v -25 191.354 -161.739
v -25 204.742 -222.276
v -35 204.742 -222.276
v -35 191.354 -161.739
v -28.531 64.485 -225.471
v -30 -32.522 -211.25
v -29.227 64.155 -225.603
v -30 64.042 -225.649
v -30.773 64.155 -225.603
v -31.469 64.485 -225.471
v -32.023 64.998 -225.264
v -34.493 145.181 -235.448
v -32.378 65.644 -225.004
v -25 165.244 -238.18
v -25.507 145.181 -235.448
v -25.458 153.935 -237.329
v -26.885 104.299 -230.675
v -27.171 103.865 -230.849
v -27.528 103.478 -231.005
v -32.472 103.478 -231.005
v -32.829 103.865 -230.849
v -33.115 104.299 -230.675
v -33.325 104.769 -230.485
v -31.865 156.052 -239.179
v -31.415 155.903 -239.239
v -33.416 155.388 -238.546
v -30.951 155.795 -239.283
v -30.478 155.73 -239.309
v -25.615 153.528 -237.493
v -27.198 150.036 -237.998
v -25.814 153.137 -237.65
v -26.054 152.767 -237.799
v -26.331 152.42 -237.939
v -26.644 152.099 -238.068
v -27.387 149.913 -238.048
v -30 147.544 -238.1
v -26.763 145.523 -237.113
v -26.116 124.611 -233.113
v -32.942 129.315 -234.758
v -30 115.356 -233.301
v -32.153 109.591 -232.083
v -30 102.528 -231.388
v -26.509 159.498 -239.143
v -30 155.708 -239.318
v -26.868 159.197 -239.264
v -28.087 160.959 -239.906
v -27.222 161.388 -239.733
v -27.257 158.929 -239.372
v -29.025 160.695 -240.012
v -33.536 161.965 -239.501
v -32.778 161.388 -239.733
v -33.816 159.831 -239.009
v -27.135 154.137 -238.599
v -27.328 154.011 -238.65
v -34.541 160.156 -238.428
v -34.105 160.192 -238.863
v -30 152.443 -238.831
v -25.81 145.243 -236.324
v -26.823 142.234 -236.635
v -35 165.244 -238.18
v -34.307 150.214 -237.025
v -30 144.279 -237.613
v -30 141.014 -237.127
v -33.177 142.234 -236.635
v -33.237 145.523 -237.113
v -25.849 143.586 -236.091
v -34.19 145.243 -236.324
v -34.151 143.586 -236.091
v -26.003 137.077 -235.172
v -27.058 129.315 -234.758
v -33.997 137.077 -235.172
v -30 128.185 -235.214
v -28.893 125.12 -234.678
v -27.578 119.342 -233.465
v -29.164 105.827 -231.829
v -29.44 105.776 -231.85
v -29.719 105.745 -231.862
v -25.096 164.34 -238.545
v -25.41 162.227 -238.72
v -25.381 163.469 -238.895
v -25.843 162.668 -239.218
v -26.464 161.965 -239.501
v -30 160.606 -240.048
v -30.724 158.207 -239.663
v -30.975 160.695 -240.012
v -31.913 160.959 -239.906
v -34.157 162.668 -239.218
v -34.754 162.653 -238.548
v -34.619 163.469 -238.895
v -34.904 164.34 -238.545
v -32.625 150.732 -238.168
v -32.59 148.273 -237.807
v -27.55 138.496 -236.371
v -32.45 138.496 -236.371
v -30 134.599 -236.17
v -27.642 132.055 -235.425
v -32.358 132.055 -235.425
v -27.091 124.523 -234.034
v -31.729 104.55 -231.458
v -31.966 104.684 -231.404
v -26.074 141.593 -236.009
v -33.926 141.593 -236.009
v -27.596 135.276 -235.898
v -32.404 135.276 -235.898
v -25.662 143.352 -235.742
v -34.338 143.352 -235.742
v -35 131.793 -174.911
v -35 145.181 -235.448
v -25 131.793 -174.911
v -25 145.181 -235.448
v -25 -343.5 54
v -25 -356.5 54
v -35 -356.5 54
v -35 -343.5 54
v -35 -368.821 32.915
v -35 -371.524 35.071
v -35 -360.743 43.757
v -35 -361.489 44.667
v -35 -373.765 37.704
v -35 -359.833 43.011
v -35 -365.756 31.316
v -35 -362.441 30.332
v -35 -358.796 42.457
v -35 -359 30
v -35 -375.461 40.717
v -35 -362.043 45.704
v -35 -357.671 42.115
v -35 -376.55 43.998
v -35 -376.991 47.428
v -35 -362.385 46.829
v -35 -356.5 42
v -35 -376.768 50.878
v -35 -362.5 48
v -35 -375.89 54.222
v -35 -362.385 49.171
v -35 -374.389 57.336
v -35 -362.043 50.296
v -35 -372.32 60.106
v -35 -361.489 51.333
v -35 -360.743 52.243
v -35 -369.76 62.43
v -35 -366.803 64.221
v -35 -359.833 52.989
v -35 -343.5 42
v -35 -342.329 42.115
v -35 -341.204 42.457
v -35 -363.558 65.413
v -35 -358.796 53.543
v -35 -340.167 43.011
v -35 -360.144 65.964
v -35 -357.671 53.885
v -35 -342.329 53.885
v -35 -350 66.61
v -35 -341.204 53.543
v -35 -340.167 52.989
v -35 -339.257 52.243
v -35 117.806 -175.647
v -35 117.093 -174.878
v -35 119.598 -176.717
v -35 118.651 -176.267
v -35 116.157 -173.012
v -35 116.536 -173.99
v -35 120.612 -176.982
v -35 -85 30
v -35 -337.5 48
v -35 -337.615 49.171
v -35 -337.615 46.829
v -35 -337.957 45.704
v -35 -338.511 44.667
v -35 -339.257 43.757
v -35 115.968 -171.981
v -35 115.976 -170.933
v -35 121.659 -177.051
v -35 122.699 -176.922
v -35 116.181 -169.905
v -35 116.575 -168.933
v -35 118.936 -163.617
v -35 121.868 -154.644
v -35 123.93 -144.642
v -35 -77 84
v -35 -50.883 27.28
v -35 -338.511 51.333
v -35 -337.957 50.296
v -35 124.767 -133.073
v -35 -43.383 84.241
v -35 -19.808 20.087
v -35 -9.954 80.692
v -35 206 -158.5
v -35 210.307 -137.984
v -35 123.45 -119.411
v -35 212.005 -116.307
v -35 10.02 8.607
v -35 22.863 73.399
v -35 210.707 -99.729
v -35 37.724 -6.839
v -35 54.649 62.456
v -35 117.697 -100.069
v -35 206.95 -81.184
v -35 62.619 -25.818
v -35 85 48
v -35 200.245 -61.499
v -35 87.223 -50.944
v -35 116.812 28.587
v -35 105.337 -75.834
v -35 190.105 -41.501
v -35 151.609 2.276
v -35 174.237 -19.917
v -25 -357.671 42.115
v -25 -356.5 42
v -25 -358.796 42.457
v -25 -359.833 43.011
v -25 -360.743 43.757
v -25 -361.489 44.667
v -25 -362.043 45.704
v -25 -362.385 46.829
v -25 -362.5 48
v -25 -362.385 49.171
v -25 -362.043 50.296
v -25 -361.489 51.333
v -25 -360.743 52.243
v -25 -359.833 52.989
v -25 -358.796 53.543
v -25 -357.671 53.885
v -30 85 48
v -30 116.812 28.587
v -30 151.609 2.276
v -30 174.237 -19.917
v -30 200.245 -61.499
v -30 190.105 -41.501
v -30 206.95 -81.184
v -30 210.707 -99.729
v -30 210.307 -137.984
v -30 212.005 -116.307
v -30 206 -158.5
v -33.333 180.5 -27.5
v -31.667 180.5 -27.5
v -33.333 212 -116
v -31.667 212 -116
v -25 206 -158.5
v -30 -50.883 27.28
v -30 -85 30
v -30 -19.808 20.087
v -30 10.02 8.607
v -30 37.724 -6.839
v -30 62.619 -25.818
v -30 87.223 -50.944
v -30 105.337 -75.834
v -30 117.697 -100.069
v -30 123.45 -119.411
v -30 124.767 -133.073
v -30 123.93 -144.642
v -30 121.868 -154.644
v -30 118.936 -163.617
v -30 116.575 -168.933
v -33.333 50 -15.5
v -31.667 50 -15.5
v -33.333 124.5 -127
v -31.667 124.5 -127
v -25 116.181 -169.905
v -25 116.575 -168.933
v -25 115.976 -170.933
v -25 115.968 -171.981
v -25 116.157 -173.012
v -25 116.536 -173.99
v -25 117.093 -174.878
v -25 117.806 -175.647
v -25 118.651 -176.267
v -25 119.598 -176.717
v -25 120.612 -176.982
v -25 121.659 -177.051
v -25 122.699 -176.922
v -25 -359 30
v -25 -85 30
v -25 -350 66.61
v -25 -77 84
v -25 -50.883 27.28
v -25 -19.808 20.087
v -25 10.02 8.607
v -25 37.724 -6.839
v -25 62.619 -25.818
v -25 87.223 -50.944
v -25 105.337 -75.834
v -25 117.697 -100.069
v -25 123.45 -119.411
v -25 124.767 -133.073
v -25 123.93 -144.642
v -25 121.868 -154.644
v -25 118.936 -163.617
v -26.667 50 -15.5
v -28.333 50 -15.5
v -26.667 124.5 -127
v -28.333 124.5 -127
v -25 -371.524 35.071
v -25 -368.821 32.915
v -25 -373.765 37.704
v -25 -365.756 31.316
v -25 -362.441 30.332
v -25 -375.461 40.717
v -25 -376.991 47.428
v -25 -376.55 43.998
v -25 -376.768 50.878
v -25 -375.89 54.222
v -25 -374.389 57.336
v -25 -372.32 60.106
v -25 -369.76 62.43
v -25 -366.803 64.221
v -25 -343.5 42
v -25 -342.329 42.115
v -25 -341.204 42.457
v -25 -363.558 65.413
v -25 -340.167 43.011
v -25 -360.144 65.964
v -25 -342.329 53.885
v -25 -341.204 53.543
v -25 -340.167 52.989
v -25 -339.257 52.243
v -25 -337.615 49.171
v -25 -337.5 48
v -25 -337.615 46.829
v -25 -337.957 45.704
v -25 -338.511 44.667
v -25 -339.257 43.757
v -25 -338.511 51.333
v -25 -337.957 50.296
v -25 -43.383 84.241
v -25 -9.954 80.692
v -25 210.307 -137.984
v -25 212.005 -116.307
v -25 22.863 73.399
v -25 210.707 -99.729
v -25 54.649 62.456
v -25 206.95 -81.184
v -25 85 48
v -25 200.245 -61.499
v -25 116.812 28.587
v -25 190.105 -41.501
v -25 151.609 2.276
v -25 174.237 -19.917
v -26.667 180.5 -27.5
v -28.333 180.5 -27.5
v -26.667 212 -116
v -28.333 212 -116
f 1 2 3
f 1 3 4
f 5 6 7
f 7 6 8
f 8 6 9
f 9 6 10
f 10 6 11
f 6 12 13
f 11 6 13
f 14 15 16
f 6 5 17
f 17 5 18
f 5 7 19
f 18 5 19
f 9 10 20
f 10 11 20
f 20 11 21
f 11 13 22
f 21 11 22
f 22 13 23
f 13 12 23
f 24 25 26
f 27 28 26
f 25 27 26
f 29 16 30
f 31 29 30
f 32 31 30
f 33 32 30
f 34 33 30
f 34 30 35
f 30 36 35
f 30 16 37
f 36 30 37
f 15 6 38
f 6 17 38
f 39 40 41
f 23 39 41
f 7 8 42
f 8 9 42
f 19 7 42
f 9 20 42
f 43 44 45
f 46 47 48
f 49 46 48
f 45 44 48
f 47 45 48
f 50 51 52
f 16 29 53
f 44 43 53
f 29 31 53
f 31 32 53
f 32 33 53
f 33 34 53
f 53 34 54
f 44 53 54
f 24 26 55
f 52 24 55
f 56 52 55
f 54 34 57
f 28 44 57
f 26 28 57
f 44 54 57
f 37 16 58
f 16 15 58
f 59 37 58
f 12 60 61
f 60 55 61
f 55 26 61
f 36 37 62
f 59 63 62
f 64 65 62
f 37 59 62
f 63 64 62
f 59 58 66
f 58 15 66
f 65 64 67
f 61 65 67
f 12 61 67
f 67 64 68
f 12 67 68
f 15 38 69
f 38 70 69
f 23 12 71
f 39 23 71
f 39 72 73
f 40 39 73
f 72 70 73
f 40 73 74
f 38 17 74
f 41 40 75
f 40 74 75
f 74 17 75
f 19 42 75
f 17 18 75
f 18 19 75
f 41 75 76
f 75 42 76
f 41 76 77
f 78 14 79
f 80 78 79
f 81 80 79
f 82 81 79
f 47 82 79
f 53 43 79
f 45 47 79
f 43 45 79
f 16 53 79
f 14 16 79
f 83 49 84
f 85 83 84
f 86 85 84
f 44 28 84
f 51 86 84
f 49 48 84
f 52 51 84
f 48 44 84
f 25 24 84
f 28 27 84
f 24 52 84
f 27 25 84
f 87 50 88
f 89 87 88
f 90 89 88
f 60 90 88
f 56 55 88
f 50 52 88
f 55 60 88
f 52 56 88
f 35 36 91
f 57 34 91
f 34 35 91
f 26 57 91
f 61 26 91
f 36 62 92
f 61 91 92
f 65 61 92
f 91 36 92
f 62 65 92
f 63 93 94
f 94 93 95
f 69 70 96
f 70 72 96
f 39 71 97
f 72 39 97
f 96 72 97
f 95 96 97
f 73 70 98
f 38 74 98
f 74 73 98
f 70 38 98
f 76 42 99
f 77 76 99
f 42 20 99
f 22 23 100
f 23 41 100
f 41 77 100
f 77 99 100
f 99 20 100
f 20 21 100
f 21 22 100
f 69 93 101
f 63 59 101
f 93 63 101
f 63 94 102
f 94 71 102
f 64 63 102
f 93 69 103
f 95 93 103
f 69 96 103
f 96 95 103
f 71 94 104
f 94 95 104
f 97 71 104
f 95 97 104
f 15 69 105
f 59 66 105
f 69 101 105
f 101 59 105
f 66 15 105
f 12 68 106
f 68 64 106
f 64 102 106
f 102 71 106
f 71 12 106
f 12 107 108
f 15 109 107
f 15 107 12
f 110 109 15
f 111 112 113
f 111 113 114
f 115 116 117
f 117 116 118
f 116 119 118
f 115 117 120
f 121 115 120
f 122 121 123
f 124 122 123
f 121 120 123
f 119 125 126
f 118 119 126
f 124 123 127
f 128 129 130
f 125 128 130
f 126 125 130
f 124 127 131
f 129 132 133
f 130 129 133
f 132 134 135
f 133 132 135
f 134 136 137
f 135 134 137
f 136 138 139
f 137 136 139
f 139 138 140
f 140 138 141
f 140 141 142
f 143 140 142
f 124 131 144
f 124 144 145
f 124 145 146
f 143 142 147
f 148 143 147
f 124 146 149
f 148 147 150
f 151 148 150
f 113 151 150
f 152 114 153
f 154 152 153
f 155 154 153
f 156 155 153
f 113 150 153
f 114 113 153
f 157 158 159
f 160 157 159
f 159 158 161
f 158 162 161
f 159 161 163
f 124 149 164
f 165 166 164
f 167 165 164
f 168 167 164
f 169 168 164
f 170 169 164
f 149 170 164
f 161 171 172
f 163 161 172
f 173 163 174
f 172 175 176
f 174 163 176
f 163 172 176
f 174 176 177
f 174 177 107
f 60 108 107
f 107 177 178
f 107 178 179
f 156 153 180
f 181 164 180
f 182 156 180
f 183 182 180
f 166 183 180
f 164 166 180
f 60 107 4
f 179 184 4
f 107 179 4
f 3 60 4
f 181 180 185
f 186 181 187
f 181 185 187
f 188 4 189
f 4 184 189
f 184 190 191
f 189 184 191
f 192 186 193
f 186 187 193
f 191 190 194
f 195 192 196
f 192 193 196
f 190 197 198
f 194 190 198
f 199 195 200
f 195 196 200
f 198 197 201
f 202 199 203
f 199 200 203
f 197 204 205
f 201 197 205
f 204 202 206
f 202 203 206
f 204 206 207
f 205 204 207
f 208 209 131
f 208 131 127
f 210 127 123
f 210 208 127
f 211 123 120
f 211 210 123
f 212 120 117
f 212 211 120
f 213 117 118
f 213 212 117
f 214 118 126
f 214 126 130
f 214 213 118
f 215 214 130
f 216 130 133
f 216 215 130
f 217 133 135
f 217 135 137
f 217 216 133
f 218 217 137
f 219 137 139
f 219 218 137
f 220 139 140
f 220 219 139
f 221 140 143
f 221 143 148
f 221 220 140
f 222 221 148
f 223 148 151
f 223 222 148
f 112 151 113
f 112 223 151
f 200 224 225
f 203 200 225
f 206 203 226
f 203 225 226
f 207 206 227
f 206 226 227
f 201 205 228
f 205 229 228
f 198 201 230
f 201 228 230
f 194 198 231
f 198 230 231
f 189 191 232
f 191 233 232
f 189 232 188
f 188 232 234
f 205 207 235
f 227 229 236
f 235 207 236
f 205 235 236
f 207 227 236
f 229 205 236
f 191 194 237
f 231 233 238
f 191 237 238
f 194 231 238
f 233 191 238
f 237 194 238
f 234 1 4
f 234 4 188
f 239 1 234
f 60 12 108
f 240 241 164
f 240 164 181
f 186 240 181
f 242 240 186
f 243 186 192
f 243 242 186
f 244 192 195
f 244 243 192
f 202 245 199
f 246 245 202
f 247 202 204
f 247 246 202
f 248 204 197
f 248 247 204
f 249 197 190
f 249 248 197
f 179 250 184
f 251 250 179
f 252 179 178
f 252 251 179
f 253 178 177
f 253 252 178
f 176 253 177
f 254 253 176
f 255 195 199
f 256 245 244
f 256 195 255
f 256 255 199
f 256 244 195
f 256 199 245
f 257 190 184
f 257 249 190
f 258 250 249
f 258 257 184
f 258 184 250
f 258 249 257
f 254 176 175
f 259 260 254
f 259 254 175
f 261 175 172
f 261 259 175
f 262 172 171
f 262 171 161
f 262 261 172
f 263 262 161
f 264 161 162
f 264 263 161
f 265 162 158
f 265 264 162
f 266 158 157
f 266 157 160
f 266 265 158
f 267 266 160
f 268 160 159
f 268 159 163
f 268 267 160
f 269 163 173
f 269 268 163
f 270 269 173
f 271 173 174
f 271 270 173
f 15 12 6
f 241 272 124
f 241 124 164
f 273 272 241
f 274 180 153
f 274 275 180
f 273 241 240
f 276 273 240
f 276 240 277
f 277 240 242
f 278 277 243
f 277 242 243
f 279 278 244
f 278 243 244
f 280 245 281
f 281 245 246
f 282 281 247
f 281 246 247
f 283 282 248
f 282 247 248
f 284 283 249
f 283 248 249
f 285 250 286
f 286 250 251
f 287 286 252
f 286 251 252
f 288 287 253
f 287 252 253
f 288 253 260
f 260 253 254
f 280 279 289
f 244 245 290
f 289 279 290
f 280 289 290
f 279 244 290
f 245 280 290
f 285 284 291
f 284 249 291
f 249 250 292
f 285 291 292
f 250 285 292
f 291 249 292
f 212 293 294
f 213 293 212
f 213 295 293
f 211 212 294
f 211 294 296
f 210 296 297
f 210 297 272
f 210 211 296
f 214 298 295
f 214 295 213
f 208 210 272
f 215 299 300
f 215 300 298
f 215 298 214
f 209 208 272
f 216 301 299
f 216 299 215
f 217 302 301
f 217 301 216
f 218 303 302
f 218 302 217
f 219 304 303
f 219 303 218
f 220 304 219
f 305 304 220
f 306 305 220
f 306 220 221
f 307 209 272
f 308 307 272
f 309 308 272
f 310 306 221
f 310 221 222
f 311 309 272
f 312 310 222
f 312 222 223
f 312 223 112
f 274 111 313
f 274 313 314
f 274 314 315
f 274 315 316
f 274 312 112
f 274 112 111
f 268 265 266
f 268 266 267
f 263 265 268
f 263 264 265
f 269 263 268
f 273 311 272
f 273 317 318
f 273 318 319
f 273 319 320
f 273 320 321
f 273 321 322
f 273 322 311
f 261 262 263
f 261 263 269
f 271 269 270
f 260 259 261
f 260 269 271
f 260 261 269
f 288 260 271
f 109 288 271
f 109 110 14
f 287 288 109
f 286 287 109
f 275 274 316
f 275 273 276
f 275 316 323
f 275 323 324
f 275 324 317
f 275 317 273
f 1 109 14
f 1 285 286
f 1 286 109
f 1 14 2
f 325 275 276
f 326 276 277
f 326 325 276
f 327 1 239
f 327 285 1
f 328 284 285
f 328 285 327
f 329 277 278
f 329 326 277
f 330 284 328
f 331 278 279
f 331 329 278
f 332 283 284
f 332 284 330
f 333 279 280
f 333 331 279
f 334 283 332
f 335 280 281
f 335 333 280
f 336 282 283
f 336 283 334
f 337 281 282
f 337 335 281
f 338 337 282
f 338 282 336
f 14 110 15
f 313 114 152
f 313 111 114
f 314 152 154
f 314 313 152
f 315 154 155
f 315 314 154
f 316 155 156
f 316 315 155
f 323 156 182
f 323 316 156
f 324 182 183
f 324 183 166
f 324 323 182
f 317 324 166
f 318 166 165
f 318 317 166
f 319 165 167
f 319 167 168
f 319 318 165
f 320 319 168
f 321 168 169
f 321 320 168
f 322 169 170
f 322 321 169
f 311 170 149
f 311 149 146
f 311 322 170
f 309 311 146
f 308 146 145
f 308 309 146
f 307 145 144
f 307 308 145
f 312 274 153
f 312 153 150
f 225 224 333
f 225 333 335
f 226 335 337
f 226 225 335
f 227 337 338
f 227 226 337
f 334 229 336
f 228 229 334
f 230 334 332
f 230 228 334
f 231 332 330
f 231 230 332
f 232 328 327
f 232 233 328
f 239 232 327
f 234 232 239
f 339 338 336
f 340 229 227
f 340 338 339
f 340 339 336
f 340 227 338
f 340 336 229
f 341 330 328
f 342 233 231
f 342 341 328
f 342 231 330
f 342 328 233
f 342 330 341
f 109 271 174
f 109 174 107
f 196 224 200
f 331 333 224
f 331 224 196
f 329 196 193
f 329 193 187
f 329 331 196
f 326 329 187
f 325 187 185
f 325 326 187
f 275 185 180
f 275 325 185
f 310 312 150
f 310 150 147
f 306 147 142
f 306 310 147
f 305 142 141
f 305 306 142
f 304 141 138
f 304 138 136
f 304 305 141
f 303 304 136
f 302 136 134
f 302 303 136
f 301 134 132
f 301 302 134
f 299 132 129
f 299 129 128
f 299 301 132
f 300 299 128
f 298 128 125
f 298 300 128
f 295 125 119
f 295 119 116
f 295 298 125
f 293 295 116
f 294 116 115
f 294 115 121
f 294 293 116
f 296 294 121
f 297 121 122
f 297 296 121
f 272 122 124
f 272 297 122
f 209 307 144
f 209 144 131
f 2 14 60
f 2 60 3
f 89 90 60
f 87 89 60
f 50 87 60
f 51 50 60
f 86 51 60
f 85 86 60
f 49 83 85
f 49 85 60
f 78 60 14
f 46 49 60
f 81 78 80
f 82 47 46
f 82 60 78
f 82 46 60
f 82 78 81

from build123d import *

# Parameters (mm, degrees)
F1_DEPTH = 5
F2_ANGLE = 90


with BuildPart() as f1:
    # F0 (on Front) → F1 (new body, symmetric)
    with BuildSketch(Plane.XZ):
        with BuildLine():
            Line((273, 36), (0, 18.6097864581))
            Line((0, 18.6097864581), (-10.1442882229, 17.9635910793))
            ThreePointArc((-10.1442882229, 17.9635910793), (-26.9908954672, -0.5724336526), (-9, -18))
            Line((-9, -18), (265, -18))
            add(Edge.make_bspline(
                [(265, -18), (310, -18), (406.8679036126, -46.6311179489), (489.31460039, -164.7387197182), (468.8864991068, -212.4993609156), (466.5754698987, -216.9332242423)],
                knots=[0, 0, 0, 0, 0.3972155542, 0.7825964326, 1, 1, 1, 1], degree=3))
            ThreePointArc((466.5754698987, -216.9332242423), (472.8213356215, -214.1061695722), (477.0533174327, -219.5))
            ThreePointArc((477.0533174327, -219.5), (475.8300498393, -222.9770681469), (472.6991622653, -224.9223006529))
            Line((472.6991622653, -224.9223006529), (481.7930329869, -222.9111561664))
            Line((481.7930329869, -222.9111561664), (541.3538880895, -209.7390439802))
            Line((541.3538880895, -209.7390439802), (556, -206.5))
            add(Edge.make_bspline(
                [(435, 0), (456.9281394948, -12.0065273205), (545.1260274002, -66.7040872695), (566.7745237898, -163.0993973046), (559.2541435751, -191.8572355891), (556, -206.5)],
                knots=[0, 0, 0, 0, 0.4044974221, 0.7598198092, 1, 1, 1, 1], degree=3))
            ThreePointArc((435, 0), (356.5575563064, 29.5090033787), (273, 36))
        make_face()
        with BuildLine():
            Line((6.5, -6), (-6.5, -6))
            ThreePointArc((-6.5, -6), (-12.5, 0), (-6.5, 6))
            Line((-6.5, 6), (0, 6))
            Line((0, 6), (6.5, 6))
            ThreePointArc((6.5, 6), (12.5, 0), (6.5, -6))
        make_face(mode=Mode.SUBTRACT)
        with BuildLine():
            ThreePointArc((477.0533174327, -219.5), (472.8213356215, -214.1061695722), (466.5754698987, -216.9332242423))
            ThreePointArc((466.5754698987, -216.9332242423), (467.0925146794, -222.8783735224), (472.6991622653, -224.9223006529))
            ThreePointArc((472.6991622653, -224.9223006529), (475.8300498393, -222.9770681469), (477.0533174327, -219.5))
        make_face()
        Polygon((554.741936541, -270.2763065435), (541.3538880895, -209.7390439802), (481.7930329869, -222.9111561664), (495.1810814384, -283.4484187297), (515.2443770491, -286.180481913), align=None)
    extrude(amount=F1_DEPTH, both=True)


with BuildPart() as f1_1:
    # F2: moved
    add(f1.part.rotate(Axis((0, 0, 97.4653586745), (0, 0, 1)), F2_ANGLE))

    # F4 (on face) → F5 section 0
    with BuildSketch(Plane(origin=(0, 171.0419719317, -424.7777897972), x_dir=(1, 0, 0), z_dir=(0, 0.3735186178, -0.9276226831)), mode=Mode.PRIVATE) as f5_s0:
        with BuildLine():
            Line((-5, -371.0586334279), (5, -371.0586334279))
            ThreePointArc((5, -371.0586334279), (0, -366.0586334279), (-5, -371.0586334279))
        make_face()
    loft([f5_s0.sketch, Vertex(0, 317.4776060293, -259.2501448204)])


with BuildPart() as f1_2:
    # F6: moved
    add(f1_1.part.moved(Location((0, -350, 48))))


with BuildPart() as f1_3:
    # F7: moved
    add(f1_2.part.moved(Location((-30, 0, 0))))


solid = f1_3.part
